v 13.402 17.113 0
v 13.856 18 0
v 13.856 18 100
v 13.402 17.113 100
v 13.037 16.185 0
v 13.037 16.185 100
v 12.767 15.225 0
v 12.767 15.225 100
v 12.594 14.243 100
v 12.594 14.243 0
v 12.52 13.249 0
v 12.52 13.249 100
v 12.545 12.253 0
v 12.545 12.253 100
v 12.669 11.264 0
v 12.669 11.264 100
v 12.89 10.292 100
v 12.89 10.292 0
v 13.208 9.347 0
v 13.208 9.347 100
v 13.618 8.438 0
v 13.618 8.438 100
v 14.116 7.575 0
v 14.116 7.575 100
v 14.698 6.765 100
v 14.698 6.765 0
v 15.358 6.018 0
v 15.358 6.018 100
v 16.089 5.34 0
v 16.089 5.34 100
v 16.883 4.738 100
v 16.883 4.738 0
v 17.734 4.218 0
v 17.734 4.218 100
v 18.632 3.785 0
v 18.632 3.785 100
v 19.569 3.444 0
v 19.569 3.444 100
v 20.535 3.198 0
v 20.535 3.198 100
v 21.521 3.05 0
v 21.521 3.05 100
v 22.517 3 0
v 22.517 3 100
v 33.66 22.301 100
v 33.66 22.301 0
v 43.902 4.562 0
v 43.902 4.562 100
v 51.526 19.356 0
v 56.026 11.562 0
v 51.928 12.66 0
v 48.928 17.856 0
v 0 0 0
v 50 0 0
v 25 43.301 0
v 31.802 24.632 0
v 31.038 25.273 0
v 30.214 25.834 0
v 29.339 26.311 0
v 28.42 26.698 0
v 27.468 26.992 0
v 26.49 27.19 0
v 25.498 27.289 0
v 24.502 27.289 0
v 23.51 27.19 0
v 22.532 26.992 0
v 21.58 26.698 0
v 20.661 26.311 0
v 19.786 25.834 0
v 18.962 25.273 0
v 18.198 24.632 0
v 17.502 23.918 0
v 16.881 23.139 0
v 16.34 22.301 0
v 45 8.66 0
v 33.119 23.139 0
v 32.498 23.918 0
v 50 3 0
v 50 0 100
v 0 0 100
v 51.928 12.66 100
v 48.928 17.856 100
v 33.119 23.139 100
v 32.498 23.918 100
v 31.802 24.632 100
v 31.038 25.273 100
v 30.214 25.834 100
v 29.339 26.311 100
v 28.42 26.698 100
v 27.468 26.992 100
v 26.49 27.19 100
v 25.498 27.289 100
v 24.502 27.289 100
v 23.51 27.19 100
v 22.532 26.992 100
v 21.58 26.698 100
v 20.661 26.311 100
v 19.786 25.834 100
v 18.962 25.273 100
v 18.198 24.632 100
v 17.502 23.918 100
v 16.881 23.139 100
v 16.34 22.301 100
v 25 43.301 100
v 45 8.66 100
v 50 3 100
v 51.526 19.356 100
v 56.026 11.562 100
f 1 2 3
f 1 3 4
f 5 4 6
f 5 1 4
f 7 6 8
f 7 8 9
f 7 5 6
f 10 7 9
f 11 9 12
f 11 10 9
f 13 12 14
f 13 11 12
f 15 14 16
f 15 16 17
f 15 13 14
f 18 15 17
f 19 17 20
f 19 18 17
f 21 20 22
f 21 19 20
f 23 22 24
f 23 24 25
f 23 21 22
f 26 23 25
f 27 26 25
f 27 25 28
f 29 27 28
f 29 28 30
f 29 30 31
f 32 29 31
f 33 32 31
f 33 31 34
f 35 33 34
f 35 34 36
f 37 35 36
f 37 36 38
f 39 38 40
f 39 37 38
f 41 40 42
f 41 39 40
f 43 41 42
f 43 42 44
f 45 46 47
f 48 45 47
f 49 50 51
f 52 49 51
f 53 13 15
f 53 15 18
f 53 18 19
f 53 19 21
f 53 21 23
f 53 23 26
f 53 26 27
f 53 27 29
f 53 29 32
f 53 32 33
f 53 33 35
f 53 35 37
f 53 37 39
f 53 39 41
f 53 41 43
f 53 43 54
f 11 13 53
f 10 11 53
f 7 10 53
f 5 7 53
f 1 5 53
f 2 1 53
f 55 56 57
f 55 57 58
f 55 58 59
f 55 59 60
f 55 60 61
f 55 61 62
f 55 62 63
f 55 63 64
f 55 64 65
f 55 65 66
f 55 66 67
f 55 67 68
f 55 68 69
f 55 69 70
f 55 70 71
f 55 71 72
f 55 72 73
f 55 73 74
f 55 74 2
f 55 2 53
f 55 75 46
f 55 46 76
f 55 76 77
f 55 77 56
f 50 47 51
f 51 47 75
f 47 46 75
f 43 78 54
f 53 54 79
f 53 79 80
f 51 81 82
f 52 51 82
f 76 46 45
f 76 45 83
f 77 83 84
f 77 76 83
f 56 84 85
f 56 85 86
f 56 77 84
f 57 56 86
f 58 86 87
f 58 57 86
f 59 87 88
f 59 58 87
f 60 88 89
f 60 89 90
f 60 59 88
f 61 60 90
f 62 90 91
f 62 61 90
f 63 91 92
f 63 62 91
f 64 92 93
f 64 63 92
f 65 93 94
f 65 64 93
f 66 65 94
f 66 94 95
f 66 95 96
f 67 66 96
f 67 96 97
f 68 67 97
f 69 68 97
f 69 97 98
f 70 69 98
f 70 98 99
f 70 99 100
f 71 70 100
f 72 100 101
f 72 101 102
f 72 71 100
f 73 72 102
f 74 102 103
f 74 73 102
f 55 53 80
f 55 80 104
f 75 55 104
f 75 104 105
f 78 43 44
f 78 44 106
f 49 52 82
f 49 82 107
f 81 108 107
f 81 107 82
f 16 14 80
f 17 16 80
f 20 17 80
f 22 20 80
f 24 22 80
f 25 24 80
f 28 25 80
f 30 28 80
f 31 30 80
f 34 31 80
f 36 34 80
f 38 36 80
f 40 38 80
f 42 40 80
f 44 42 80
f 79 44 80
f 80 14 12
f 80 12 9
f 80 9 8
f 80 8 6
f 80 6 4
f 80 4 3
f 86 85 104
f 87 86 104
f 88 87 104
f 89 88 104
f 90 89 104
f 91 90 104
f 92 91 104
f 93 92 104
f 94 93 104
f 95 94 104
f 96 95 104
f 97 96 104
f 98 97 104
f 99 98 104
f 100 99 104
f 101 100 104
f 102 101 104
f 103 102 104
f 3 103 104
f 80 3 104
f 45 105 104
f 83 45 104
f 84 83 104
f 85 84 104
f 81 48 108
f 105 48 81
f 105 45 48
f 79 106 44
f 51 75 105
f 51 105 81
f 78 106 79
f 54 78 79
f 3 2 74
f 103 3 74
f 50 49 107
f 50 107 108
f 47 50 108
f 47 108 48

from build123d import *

# Parameters (mm, degrees)
PAD_DEPTH = 100


with BuildPart() as part:
    # Sketch → Pad (new body)
    with BuildSketch(Plane.XY):
        with BuildLine():
            Line((50, 0), (0, 0))
            Line((0, 0), (25, 43.30127))
            Line((25, 43.30127), (45, 8.660254))
            Line((45, 8.660254), (51.928203, 12.660254))
            Line((51.928203, 12.660254), (48.928203, 17.856406))
            Line((48.928203, 17.856406), (51.526279, 19.356406))
            Line((51.526279, 19.356406), (56.026279, 11.562178))
            Line((56.026279, 11.562178), (43.901924, 4.562178))
            Line((33.660254, 22.30127), (43.901924, 4.562178))
            ThreePointArc((33.660254, 22.30127), (25, 27.30127), (16.339746, 22.30127))
            Line((13.856406, 18), (16.339746, 22.30127))
            ThreePointArc((13.856406, 18), (13.856406, 8), (22.51666, 3))
            Line((22.51666, 3), (50, 3))
            Line((50, 3), (50, 0))
        make_face()
    extrude(amount=PAD_DEPTH)


solid = part.part
